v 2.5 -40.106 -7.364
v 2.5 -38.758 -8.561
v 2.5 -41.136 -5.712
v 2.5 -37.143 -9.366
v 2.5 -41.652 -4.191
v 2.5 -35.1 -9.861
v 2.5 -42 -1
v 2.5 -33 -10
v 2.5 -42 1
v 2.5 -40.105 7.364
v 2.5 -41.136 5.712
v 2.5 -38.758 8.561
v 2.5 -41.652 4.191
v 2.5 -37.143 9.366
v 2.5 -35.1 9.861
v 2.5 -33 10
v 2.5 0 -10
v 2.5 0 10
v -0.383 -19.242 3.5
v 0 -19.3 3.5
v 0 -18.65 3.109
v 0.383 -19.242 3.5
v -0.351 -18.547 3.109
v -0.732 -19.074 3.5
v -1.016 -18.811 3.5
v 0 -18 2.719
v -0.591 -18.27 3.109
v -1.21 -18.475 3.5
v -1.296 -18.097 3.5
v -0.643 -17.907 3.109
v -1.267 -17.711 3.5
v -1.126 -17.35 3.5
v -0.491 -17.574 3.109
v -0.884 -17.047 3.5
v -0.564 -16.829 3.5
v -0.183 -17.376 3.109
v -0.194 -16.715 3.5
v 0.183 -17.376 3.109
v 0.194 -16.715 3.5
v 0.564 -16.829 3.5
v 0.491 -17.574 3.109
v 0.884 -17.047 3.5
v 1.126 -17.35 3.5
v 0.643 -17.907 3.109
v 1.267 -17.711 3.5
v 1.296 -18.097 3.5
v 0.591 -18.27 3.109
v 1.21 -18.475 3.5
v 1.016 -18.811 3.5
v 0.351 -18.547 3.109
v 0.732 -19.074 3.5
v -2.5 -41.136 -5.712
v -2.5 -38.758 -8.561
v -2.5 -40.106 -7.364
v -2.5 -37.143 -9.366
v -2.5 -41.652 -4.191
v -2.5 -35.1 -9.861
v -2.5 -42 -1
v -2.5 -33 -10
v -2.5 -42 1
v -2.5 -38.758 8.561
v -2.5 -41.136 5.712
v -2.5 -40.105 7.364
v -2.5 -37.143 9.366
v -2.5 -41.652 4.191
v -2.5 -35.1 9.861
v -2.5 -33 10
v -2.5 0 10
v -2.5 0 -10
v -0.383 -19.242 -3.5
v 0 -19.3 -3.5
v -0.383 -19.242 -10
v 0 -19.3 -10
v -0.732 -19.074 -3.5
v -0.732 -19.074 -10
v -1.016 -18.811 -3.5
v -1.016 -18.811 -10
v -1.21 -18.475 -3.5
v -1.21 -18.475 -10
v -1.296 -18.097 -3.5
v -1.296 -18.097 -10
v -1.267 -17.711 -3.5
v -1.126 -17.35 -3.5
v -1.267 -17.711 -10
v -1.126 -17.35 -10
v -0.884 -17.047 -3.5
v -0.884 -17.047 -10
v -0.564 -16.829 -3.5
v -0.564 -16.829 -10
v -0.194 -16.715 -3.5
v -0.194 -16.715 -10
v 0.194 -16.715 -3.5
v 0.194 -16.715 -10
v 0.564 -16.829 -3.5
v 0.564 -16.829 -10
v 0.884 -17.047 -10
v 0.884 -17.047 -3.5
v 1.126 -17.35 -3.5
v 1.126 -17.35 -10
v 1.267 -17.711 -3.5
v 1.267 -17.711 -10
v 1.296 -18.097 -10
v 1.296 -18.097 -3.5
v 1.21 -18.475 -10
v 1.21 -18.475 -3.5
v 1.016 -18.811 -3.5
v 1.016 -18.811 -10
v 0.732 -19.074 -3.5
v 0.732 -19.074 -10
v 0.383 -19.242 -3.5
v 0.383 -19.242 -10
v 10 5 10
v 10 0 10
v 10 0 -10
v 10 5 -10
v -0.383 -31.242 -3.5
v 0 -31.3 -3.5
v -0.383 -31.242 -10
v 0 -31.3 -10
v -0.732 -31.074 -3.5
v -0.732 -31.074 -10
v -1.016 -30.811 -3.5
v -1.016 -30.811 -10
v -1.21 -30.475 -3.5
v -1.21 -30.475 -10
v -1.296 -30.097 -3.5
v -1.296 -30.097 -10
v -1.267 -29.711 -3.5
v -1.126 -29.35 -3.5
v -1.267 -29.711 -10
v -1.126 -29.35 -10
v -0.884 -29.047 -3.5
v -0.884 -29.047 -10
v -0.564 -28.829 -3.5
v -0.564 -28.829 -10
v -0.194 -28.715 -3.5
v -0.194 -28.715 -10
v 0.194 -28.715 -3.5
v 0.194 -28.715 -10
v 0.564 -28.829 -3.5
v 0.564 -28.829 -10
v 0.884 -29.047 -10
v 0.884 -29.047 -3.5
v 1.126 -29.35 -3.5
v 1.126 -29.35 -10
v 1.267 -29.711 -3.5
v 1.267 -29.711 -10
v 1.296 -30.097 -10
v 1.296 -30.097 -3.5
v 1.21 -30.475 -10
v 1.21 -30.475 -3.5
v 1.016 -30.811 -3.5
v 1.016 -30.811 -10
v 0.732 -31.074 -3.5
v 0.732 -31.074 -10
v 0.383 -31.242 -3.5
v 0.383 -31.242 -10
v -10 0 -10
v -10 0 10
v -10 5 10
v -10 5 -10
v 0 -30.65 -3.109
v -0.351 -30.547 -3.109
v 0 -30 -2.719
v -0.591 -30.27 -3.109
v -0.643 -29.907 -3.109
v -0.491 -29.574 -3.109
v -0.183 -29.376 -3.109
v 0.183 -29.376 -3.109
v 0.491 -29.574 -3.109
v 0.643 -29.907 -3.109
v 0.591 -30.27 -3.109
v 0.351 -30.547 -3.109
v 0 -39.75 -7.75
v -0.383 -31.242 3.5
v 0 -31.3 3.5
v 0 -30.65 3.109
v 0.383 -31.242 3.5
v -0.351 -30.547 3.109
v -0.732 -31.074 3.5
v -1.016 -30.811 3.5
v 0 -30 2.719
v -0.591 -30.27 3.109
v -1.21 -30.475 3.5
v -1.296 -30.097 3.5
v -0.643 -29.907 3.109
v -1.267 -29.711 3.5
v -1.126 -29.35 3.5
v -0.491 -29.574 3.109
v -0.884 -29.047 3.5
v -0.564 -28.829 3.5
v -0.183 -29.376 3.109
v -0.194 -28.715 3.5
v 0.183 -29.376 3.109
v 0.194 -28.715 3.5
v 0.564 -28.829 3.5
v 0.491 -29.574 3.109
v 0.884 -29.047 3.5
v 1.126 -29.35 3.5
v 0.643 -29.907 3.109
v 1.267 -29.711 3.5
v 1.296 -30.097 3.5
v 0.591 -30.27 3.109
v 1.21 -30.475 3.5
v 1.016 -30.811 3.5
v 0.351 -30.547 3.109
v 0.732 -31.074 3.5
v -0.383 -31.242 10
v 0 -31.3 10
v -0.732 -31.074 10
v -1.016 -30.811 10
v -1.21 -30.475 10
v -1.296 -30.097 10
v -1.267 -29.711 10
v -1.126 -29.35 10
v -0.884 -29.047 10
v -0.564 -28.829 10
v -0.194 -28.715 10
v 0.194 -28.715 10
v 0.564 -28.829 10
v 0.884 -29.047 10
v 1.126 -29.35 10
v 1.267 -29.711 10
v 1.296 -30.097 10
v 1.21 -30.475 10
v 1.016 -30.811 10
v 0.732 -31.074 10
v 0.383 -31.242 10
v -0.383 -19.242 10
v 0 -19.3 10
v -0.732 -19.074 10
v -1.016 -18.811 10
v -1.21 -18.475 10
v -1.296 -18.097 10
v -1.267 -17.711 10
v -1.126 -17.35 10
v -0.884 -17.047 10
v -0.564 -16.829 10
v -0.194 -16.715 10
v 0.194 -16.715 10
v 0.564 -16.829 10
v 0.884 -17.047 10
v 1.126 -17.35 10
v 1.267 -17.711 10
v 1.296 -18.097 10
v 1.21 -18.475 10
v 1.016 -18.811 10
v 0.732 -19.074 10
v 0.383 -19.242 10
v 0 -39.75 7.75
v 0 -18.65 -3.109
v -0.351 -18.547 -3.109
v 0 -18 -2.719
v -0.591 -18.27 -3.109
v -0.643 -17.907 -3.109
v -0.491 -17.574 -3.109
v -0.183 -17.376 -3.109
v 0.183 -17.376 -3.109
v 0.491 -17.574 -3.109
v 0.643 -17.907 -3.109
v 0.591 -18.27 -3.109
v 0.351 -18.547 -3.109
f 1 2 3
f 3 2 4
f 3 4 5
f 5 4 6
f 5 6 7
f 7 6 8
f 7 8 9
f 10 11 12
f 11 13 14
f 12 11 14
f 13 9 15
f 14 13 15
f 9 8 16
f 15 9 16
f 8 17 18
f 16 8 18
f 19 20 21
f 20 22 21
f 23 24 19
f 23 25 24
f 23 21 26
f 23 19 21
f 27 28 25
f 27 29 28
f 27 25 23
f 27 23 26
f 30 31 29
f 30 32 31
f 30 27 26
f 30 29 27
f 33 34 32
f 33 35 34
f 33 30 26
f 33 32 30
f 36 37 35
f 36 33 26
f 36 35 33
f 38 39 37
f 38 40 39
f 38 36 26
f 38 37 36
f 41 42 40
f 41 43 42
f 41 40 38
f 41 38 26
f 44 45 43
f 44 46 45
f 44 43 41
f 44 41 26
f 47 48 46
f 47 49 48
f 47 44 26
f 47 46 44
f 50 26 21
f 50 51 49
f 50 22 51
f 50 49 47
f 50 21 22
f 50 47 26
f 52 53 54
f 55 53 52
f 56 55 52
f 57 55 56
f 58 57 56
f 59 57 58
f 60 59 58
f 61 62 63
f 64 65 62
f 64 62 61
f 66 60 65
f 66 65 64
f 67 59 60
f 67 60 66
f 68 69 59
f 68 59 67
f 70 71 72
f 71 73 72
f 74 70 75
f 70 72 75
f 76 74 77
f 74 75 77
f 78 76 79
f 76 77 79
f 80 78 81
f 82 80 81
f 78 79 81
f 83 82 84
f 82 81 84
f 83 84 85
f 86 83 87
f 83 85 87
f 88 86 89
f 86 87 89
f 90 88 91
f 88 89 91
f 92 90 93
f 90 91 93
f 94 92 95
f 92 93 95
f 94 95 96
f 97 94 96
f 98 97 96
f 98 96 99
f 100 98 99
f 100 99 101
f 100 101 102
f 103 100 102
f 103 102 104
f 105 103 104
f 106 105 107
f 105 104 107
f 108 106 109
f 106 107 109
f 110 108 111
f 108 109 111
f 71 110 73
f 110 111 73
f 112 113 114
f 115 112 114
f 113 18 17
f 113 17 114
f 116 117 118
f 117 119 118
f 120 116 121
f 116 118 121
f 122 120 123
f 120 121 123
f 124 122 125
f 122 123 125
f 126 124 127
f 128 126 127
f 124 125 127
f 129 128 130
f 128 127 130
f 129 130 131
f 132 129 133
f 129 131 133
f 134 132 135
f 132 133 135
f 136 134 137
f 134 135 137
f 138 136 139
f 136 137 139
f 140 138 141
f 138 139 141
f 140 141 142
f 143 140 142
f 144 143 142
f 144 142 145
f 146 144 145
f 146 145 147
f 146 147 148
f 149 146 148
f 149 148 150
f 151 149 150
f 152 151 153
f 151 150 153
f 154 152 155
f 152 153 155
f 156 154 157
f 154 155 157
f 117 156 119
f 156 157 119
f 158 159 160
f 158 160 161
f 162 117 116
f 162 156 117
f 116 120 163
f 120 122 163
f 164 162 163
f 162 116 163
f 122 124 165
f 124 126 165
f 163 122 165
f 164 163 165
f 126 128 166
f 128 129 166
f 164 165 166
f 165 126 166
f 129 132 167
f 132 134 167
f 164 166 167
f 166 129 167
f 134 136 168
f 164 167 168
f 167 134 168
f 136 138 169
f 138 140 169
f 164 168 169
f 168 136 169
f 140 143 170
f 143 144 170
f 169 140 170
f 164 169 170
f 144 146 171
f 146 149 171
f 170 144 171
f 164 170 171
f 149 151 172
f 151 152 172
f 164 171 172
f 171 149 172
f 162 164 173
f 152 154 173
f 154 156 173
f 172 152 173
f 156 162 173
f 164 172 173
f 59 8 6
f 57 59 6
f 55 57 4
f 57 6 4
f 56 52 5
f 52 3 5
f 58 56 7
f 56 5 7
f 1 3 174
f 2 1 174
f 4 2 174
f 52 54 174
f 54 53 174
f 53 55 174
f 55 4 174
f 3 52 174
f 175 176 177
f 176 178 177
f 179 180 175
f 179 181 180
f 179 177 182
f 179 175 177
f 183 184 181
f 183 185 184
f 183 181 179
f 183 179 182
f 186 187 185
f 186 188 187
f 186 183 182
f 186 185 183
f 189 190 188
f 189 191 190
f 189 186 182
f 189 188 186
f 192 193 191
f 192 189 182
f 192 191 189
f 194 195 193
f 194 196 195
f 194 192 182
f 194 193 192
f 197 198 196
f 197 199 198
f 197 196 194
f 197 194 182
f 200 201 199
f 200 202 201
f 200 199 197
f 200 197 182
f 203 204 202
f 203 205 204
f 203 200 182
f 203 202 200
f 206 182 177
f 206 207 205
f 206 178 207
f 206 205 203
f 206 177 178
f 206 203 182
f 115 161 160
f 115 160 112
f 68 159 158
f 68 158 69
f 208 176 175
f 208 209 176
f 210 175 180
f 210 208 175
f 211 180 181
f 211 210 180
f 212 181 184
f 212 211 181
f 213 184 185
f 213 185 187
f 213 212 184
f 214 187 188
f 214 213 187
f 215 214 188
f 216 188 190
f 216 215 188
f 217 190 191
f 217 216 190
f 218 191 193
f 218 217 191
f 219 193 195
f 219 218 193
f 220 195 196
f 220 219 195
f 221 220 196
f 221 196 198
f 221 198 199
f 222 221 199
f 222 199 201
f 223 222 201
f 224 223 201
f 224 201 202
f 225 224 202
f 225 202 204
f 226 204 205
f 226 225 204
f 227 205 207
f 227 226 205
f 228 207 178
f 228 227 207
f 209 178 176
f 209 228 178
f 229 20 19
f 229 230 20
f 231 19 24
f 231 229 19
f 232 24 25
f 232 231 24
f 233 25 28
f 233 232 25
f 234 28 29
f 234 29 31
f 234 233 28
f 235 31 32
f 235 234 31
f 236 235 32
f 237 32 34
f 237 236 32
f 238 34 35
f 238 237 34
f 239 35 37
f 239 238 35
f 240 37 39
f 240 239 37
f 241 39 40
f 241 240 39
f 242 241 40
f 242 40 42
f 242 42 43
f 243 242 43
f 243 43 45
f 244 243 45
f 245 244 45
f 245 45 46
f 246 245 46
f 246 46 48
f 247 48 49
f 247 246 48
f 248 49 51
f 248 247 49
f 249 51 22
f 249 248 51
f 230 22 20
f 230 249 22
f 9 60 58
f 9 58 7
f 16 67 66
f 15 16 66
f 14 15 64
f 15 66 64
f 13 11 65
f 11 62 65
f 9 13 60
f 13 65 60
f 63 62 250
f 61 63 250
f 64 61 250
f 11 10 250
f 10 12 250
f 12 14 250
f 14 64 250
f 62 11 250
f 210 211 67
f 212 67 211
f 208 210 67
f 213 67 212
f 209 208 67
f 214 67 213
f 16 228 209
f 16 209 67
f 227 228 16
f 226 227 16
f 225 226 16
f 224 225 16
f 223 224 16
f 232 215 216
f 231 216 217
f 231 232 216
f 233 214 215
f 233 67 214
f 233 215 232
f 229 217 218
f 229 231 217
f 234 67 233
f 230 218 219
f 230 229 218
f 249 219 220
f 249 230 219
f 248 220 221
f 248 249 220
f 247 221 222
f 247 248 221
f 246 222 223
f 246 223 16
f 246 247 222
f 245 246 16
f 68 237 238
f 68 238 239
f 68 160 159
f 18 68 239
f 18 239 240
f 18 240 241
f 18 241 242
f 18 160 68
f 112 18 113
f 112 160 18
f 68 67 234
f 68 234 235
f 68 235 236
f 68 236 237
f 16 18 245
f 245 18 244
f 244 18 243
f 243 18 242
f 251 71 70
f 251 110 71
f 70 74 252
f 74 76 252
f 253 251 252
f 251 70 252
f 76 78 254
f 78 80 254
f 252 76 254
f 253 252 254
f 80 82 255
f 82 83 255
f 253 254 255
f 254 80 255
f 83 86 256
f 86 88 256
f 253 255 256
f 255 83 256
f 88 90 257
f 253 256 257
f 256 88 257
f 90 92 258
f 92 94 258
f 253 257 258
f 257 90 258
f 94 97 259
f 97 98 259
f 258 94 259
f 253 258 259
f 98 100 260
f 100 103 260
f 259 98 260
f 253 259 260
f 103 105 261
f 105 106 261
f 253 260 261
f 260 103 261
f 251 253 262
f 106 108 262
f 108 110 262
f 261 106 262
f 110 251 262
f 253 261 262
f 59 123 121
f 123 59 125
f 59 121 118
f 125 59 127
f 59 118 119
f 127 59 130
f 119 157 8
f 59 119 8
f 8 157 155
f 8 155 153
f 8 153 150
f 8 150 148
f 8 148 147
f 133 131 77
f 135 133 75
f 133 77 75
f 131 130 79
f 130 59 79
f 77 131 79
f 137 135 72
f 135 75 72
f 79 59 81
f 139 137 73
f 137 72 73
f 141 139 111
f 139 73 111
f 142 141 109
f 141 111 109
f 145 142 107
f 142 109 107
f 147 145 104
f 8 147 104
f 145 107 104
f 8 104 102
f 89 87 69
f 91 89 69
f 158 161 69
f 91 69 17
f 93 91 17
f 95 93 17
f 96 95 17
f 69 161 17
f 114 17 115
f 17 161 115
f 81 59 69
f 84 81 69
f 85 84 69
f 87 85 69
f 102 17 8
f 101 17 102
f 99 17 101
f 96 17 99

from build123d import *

# Parameters (mm, degrees)
SKETCH_1_W           = 20
SKETCH_1_H           = 20
EXTRUDE_1_DEPTH      = 5
SKETCH_2_W           = 5
SKETCH_2_H           = 20
EXTRUDE_2_DEPTH      = 35
F_1_0MM_1_AT_2_COUNT = 2
F_1_0MM_1_AT_2_PITCH = 12
SKETCH_5_W           = 5
SKETCH_5_H           = 20
EXTRUDE_3_DEPTH      = 7
FILLET_1_SIZE        = 9


with BuildPart() as part:
    # 草圖1 → 填料-伸長1 (new body)
    with BuildSketch(Plane(origin=(0, 0, 0), x_dir=(1, 0, 0), z_dir=(0, 1, 0))):
        Rectangle(SKETCH_1_W, SKETCH_1_H)
    extrude(amount=EXTRUDE_1_DEPTH)

    # 草圖2 → 填料-伸長2 (add)
    with BuildSketch(Plane.XZ):
        Rectangle(SKETCH_2_W, SKETCH_2_H)
    extrude(amount=EXTRUDE_2_DEPTH)

    # 草圖4 → Ø1.0mm 定位孔1 (revolve, cut)
    with BuildSketch(Plane(origin=(0, -18, 10), x_dir=(0, -1, 0), z_dir=(1, 0, 0))):
        Polygon((0, 0), (0, 7.281118805), (1.3, 6.5), (1.3, 0), align=None)
    f_1_0mm_1 = revolve(axis=Axis((0, -18, 16.35), (0, 0, -1)), mode=Mode.SUBTRACT)

    # Ø1.0mm 定位孔1 at 2: Ø1.0mm 定位孔1 ×2
    with Locations(*[(0, -i * F_1_0MM_1_AT_2_PITCH, 0) for i in range(1, F_1_0MM_1_AT_2_COUNT)]):
        add(f_1_0mm_1, mode=Mode.SUBTRACT)

    # 鏡射1: Ø1.0mm 定位孔1 across plane
    add(f_1_0mm_1.mirror(Plane.XY), mode=Mode.SUBTRACT)

    # 鏡射1 copy 1 sketch → 鏡射1 copy 1 (revolve, cut)
    with BuildSketch(Plane(origin=(0, -30, -10), x_dir=(0, -1, 0), z_dir=(1, 0, 0))):
        Polygon((0, 0), (0, -7.281118805), (1.3, -6.5), (1.3, 0), align=None)
    revolve(axis=Axis((0, -30, -16.35), (0, 0, -1)), mode=Mode.SUBTRACT)

    # 草圖5 → 填料-伸長3 (add)
    with BuildSketch(Plane.XZ.offset(35)):
        Rectangle(SKETCH_5_W, SKETCH_5_H)
    extrude(amount=EXTRUDE_3_DEPTH)

    # 圓角1
    # a fillet whose section is not a circle: 9 mm, written as the material it takes off along each edge
    with BuildSketch(Plane(origin=(-25, -42, 10), x_dir=(0, 1, 0), z_dir=(1, 0, 0)), Plane(origin=(25, -42, -10), x_dir=(0, 1, 0), z_dir=(-1, 0, 0))) as fillet_1_piece_1:
        with BuildLine():
            Bezier((FILLET_1_SIZE, 0), (0, 0), (0, -FILLET_1_SIZE), weights=[1, 1, 1])
            Line((0, -FILLET_1_SIZE), (0, 0))
            Line((0, 0), (FILLET_1_SIZE, 0))
        make_face()
    extrude(amount=50, mode=Mode.SUBTRACT)


solid = part.part
